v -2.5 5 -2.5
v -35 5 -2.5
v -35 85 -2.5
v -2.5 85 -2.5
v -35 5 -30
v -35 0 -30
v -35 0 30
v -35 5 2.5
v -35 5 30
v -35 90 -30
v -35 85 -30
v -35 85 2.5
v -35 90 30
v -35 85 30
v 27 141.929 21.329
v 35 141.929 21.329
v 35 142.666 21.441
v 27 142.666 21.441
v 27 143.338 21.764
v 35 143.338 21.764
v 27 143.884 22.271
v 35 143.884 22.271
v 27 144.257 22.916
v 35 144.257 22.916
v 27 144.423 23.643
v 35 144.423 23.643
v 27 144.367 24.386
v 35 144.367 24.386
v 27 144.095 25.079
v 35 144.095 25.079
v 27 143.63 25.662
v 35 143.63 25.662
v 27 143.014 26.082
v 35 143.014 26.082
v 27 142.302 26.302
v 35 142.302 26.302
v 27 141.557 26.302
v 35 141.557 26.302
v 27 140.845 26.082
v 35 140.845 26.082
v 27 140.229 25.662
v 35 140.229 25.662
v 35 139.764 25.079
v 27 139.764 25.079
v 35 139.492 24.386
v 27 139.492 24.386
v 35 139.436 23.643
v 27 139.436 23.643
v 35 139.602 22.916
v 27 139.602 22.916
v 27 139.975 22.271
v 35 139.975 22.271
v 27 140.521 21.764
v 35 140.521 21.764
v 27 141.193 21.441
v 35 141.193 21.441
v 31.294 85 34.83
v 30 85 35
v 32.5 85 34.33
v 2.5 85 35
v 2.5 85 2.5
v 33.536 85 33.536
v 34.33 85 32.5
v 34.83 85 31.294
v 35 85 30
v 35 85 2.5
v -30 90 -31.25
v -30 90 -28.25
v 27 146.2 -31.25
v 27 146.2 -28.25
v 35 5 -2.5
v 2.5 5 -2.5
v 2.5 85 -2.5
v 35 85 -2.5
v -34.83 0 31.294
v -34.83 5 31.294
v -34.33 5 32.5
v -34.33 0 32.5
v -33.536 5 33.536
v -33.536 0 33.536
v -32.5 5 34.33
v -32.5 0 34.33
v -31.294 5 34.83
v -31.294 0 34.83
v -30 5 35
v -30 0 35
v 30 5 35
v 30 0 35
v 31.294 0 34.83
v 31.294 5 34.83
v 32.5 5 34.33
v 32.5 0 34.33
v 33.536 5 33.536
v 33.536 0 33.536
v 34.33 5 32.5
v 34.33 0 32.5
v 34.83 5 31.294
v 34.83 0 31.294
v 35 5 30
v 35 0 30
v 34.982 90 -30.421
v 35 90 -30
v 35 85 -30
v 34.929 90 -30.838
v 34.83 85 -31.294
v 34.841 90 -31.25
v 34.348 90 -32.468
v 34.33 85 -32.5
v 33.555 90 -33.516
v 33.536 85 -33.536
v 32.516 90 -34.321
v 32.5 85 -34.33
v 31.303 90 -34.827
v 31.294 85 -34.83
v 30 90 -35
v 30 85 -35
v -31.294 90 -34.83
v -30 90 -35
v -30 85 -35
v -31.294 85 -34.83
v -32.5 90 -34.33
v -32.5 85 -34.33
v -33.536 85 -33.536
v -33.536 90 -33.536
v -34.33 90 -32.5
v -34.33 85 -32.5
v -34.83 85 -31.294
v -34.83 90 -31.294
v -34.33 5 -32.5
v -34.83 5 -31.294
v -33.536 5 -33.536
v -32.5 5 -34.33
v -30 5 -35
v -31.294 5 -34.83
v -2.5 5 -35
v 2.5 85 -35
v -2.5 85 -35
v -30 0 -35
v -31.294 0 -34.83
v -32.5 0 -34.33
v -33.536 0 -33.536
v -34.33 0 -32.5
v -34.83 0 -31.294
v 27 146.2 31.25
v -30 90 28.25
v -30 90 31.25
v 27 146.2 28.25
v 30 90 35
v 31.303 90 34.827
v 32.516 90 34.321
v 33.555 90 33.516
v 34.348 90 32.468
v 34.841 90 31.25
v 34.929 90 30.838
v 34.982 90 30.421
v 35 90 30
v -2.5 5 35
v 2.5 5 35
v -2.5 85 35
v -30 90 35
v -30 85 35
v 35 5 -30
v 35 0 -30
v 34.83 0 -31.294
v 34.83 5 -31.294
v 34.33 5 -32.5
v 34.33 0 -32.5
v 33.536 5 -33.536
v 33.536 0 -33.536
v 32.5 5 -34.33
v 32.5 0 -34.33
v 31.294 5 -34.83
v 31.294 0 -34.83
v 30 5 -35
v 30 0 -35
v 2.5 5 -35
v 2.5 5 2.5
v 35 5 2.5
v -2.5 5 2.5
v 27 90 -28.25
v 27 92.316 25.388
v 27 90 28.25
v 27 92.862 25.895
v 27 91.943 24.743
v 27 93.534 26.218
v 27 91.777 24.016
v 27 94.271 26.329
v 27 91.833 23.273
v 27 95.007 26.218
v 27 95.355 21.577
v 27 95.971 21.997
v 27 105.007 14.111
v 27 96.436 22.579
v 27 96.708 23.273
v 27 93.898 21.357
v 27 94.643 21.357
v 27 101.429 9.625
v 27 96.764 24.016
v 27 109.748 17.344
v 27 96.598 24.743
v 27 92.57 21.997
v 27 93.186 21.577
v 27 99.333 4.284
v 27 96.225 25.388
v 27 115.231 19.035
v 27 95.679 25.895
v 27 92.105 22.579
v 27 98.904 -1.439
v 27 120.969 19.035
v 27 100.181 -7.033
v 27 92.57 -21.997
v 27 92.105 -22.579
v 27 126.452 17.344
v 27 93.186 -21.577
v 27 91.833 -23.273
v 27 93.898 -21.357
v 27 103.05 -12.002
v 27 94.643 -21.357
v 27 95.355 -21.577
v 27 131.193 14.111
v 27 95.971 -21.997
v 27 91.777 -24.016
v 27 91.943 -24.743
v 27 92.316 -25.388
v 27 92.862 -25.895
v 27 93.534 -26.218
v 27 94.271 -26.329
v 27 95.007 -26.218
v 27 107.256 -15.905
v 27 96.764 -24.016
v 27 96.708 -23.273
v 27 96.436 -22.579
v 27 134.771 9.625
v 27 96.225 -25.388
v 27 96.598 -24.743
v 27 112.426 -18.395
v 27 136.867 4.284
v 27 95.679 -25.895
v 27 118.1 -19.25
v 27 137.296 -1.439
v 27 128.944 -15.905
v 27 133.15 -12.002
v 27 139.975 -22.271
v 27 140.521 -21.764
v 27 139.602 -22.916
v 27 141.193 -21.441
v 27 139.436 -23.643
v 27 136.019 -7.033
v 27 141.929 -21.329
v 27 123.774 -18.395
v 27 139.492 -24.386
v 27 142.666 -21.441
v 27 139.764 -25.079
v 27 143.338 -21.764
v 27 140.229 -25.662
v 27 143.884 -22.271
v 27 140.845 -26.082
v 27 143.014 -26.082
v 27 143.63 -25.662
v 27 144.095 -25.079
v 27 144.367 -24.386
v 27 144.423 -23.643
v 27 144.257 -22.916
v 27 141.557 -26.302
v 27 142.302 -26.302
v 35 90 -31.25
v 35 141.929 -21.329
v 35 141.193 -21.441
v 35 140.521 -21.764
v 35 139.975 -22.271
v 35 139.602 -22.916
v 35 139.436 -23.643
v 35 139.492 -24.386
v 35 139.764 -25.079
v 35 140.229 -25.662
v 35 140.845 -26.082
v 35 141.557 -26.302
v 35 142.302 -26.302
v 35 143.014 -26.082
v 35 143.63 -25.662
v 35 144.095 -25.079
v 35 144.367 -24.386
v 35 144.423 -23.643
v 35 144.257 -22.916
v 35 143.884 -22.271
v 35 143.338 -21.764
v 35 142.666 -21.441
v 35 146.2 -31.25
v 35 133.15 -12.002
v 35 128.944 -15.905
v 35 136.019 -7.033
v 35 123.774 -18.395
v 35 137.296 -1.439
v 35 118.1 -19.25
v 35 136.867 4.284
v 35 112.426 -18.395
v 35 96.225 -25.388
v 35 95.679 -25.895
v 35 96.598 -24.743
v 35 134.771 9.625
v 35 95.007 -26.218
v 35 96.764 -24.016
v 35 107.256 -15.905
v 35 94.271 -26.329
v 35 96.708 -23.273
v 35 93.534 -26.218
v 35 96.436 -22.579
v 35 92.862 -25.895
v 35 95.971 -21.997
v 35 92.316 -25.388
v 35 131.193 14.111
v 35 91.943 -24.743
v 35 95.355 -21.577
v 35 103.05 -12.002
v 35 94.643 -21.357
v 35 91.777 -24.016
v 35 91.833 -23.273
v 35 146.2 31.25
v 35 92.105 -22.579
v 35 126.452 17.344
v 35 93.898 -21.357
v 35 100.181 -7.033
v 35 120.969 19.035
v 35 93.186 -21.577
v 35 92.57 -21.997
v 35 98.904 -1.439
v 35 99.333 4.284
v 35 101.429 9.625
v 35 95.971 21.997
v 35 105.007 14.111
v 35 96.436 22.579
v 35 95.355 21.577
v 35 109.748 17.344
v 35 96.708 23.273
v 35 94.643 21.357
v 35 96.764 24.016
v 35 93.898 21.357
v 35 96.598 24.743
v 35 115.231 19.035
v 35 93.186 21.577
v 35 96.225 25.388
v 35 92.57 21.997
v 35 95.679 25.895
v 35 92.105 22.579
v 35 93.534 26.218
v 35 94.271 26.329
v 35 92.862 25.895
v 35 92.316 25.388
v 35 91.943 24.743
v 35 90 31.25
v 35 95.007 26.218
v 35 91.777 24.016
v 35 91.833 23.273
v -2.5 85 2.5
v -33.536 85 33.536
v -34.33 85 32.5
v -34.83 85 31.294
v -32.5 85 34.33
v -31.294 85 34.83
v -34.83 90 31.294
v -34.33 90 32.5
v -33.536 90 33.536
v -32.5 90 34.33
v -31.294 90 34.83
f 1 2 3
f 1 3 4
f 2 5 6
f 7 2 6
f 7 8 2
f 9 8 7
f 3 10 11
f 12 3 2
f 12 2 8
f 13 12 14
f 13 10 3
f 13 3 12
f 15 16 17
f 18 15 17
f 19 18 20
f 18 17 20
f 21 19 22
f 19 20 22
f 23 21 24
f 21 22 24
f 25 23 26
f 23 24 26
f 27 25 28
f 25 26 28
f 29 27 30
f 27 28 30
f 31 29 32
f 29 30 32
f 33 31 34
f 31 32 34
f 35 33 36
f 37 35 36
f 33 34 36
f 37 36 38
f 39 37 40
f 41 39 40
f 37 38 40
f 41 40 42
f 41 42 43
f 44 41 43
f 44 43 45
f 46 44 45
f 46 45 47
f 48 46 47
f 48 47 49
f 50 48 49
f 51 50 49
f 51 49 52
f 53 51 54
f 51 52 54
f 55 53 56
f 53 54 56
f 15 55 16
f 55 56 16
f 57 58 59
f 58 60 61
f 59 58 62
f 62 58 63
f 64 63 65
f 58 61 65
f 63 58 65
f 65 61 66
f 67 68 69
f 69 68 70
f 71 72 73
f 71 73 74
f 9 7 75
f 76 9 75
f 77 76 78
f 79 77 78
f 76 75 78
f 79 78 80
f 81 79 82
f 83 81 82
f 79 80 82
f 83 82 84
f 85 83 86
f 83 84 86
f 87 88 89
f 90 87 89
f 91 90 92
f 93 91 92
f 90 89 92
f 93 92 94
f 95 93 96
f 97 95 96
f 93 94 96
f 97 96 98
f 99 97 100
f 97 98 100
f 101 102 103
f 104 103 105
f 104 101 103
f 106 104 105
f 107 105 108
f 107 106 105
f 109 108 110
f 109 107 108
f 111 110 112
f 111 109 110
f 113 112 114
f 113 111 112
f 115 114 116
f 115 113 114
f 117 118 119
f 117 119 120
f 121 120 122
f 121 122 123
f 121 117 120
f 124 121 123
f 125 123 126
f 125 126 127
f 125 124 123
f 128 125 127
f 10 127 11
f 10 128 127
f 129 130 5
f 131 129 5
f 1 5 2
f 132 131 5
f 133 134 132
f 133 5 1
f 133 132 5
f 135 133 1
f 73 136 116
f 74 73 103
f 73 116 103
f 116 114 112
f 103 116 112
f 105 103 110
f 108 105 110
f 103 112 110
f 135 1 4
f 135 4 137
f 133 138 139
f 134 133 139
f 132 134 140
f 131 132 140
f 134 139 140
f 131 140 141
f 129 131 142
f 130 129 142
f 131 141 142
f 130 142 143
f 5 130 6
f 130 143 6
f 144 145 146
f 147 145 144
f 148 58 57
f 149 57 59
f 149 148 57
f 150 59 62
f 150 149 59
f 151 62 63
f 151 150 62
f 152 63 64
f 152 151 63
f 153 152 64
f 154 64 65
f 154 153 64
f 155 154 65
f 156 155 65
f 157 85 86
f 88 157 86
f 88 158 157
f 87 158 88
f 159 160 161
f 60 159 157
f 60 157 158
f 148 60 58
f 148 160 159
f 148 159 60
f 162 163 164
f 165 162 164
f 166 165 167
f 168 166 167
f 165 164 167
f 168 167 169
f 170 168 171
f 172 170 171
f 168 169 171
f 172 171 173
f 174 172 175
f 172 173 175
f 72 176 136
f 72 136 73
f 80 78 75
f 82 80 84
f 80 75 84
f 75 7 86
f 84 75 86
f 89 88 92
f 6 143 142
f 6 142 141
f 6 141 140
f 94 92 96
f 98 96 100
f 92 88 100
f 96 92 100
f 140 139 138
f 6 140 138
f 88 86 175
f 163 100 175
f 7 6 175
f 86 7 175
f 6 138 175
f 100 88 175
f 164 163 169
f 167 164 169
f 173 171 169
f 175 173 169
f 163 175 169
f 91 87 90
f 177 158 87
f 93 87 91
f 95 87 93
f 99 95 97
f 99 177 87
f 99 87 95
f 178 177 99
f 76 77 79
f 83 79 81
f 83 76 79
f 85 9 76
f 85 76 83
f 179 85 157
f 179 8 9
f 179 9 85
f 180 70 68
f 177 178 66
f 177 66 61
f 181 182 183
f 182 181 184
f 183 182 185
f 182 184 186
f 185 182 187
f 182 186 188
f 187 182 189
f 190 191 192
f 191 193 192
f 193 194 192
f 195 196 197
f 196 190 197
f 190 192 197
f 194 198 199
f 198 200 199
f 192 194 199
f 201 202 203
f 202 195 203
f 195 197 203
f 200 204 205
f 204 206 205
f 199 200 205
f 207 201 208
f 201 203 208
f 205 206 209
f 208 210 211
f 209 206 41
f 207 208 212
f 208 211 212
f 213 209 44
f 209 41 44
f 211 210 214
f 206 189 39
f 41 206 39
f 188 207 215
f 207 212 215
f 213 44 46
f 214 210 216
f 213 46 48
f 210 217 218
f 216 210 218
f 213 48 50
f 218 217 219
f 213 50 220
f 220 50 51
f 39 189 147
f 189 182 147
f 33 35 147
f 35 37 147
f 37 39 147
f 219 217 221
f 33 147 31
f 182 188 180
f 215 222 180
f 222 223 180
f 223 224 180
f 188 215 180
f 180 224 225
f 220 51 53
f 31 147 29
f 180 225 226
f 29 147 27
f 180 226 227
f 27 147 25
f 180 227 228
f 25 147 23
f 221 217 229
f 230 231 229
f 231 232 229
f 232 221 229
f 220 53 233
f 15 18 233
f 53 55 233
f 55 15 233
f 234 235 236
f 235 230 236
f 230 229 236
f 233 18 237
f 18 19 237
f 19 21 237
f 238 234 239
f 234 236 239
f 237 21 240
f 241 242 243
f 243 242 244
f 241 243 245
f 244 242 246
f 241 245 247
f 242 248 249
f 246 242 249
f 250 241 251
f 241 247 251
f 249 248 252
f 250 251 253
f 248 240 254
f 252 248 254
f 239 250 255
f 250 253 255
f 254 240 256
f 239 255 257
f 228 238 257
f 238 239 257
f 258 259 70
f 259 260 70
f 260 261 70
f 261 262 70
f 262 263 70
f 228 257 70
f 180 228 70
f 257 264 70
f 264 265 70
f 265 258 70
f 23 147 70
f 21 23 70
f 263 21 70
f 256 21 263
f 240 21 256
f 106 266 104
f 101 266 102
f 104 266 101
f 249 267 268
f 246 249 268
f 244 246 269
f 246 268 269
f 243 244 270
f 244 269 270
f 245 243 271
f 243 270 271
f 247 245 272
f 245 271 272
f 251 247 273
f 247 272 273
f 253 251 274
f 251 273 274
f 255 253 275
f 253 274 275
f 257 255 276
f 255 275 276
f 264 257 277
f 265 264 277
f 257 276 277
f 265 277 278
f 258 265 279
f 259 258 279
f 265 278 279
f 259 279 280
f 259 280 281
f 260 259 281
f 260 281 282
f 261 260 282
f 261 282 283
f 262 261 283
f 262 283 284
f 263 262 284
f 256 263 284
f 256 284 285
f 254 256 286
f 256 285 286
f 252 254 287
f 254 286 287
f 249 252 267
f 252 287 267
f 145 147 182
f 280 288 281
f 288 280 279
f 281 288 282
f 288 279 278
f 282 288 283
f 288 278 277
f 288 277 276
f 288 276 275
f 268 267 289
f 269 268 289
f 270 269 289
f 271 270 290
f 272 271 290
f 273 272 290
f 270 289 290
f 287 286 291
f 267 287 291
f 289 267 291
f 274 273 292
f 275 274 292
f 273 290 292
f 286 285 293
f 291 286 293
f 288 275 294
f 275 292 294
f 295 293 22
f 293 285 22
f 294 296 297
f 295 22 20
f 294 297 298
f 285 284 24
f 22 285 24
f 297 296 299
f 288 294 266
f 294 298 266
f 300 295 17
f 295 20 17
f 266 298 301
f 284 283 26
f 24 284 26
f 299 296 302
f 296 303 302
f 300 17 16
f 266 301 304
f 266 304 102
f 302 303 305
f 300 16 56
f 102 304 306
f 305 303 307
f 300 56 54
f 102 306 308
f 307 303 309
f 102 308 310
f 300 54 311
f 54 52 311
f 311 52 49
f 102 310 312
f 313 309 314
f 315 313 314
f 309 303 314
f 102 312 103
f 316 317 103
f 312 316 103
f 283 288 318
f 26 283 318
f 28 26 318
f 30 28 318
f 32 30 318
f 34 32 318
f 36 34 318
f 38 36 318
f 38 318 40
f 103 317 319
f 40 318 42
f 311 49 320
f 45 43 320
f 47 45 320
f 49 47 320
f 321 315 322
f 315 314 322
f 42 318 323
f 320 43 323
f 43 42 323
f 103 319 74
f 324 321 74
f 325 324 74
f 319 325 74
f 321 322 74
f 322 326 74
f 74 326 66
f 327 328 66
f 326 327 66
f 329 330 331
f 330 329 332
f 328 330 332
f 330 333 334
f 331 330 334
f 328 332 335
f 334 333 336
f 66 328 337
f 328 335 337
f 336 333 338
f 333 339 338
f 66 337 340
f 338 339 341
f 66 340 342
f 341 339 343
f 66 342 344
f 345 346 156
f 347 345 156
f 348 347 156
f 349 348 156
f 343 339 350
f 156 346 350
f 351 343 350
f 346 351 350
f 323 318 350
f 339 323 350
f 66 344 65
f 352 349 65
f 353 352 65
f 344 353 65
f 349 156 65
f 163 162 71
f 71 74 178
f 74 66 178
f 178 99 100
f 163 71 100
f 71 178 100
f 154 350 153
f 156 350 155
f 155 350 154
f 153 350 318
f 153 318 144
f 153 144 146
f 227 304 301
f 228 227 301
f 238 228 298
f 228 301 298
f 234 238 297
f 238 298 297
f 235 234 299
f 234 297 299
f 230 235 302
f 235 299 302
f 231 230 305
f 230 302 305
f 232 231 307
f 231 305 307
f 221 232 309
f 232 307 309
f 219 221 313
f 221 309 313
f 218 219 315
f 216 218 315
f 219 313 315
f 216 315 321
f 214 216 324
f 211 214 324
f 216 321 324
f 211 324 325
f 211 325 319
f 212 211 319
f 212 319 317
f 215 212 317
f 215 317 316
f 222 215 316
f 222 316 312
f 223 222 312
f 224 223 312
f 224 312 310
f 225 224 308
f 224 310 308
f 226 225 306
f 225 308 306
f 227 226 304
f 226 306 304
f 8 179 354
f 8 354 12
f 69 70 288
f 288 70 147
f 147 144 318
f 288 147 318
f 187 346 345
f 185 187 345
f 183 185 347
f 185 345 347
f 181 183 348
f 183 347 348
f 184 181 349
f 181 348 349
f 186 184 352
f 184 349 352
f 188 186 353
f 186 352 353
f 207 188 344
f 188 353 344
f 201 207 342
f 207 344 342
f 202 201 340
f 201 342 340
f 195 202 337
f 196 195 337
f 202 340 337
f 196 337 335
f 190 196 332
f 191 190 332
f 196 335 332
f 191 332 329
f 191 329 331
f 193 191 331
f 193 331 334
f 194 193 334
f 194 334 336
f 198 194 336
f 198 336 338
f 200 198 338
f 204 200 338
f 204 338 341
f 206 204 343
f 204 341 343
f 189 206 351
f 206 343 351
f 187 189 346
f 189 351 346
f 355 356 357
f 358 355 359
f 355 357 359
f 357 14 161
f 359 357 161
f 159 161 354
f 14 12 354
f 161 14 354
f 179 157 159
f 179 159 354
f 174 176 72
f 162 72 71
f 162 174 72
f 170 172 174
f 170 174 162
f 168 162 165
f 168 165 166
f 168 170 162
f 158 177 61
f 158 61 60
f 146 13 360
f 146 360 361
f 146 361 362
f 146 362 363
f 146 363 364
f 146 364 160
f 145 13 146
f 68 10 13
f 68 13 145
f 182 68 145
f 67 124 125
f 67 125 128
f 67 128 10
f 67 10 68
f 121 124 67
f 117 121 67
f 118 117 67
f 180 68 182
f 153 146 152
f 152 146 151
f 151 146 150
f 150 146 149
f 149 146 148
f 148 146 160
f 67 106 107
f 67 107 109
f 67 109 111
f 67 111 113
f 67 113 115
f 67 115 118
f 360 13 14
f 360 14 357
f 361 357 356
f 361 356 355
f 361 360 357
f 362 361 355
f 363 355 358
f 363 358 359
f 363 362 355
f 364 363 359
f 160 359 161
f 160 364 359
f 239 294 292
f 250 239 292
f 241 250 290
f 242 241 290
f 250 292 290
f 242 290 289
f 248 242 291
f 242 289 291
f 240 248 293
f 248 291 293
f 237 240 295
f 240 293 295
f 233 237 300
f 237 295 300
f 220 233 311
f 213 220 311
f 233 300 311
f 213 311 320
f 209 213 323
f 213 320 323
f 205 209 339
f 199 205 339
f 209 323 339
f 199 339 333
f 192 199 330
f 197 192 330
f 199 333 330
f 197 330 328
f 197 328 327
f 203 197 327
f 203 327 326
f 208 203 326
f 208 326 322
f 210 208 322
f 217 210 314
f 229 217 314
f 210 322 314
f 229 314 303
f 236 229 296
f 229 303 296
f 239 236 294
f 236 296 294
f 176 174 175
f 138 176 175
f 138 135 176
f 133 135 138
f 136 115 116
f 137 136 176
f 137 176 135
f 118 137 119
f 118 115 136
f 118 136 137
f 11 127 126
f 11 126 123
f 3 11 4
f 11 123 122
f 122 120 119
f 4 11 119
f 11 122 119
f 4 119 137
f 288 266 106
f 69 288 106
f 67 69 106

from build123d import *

# Parameters (mm, degrees)
BOSS_EXTRUDE1_DEPTH = 5
BOSS_EXTRUDE2_DEPTH = 80
SKETCH4_W           = 56.5
SKETCH4_H           = 56.2
SKETCH4_R           = 19.25
SKETCH4_R_2         = 2.5
BOSS_EXTRUDE3_DEPTH = 8
BOSS_EXTRUDE4_DEPTH = 3


with BuildPart() as part:
    # Sketch2 → Boss-Extrude1 (new body)
    with BuildSketch(Plane(origin=(0, 0, 0), x_dir=(1, 0, 0), z_dir=(0, 1, 0))):
        with BuildLine():
            Line((-30, -35), (30, -35))
            ThreePointArc((30, -35), (33.535533906, -33.535533906), (35, -30))
            Line((35, -30), (35, 30))
            ThreePointArc((35, 30), (33.535533906, 33.535533906), (30, 35))
            Line((30, 35), (-30, 35))
            ThreePointArc((-30, 35), (-33.535533906, 33.535533906), (-35, 30))
            Line((-35, 30), (-35, -30))
            ThreePointArc((-35, -30), (-33.535533906, -33.535533906), (-30, -35))
        make_face()
    boss_extrude1 = extrude(amount=BOSS_EXTRUDE1_DEPTH)

    # Sketch3 → Boss-Extrude2 (add)
    with BuildSketch(Plane(origin=(0, 5, 0), x_dir=(1, 0, 0), z_dir=(0, 1, 0))):
        Polygon((-2.5, 2.5), (-2.5, 35), (2.5, 35), (2.5, 2.5), (35, 2.5), (35, -2.5), (2.5, -2.5), (2.5, -35), (-2.5, -35), (-2.5, -2.5), (-35, -2.5), (-35, 2.5), align=None)
    extrude(amount=BOSS_EXTRUDE2_DEPTH)

    # Mirror1: Boss-Extrude1 across plane
    add(boss_extrude1.mirror(Plane.ZX.offset(45)))

    # Sketch4 → Boss-Extrude3 (add)
    with BuildSketch(Plane(origin=(35, 0, 0), x_dir=(0, 0, -1), z_dir=(1, 0, 0))):
        with Locations((0, 118.1)):
            Rectangle(SKETCH4_W, SKETCH4_H)
        with Locations((0, 118.1)):
            Circle(SKETCH4_R, mode=Mode.SUBTRACT)
        with Locations((-23.829498526, 141.929498526)):
            Circle(SKETCH4_R_2, mode=Mode.SUBTRACT)
        with Locations(Location((23.829498526, 141.929498526, 0), (0, 0, 180))):
            Circle(SKETCH4_R_2, mode=Mode.SUBTRACT)
        with Locations((23.829498526, 94.270501474)):
            Circle(SKETCH4_R_2, mode=Mode.SUBTRACT)
        with Locations(Location((-23.829498526, 94.270501474, 0), (0, 0, 180))):
            Circle(SKETCH4_R_2, mode=Mode.SUBTRACT)
    extrude(amount=-BOSS_EXTRUDE3_DEPTH)

    # Sketch5 → Boss-Extrude4 (add)
    with BuildSketch(Plane.XY.offset(28.25)):
        Polygon((35, 90), (-30, 90), (27, 146.2), (35, 146.2), align=None)
    boss_extrude4 = extrude(amount=BOSS_EXTRUDE4_DEPTH)

    # Mirror2: Boss-Extrude4 across plane
    add(boss_extrude4.mirror(Plane(origin=(0, 0, 0), x_dir=(1, 0, 0), z_dir=(0, 0, -1))))


solid = part.part
